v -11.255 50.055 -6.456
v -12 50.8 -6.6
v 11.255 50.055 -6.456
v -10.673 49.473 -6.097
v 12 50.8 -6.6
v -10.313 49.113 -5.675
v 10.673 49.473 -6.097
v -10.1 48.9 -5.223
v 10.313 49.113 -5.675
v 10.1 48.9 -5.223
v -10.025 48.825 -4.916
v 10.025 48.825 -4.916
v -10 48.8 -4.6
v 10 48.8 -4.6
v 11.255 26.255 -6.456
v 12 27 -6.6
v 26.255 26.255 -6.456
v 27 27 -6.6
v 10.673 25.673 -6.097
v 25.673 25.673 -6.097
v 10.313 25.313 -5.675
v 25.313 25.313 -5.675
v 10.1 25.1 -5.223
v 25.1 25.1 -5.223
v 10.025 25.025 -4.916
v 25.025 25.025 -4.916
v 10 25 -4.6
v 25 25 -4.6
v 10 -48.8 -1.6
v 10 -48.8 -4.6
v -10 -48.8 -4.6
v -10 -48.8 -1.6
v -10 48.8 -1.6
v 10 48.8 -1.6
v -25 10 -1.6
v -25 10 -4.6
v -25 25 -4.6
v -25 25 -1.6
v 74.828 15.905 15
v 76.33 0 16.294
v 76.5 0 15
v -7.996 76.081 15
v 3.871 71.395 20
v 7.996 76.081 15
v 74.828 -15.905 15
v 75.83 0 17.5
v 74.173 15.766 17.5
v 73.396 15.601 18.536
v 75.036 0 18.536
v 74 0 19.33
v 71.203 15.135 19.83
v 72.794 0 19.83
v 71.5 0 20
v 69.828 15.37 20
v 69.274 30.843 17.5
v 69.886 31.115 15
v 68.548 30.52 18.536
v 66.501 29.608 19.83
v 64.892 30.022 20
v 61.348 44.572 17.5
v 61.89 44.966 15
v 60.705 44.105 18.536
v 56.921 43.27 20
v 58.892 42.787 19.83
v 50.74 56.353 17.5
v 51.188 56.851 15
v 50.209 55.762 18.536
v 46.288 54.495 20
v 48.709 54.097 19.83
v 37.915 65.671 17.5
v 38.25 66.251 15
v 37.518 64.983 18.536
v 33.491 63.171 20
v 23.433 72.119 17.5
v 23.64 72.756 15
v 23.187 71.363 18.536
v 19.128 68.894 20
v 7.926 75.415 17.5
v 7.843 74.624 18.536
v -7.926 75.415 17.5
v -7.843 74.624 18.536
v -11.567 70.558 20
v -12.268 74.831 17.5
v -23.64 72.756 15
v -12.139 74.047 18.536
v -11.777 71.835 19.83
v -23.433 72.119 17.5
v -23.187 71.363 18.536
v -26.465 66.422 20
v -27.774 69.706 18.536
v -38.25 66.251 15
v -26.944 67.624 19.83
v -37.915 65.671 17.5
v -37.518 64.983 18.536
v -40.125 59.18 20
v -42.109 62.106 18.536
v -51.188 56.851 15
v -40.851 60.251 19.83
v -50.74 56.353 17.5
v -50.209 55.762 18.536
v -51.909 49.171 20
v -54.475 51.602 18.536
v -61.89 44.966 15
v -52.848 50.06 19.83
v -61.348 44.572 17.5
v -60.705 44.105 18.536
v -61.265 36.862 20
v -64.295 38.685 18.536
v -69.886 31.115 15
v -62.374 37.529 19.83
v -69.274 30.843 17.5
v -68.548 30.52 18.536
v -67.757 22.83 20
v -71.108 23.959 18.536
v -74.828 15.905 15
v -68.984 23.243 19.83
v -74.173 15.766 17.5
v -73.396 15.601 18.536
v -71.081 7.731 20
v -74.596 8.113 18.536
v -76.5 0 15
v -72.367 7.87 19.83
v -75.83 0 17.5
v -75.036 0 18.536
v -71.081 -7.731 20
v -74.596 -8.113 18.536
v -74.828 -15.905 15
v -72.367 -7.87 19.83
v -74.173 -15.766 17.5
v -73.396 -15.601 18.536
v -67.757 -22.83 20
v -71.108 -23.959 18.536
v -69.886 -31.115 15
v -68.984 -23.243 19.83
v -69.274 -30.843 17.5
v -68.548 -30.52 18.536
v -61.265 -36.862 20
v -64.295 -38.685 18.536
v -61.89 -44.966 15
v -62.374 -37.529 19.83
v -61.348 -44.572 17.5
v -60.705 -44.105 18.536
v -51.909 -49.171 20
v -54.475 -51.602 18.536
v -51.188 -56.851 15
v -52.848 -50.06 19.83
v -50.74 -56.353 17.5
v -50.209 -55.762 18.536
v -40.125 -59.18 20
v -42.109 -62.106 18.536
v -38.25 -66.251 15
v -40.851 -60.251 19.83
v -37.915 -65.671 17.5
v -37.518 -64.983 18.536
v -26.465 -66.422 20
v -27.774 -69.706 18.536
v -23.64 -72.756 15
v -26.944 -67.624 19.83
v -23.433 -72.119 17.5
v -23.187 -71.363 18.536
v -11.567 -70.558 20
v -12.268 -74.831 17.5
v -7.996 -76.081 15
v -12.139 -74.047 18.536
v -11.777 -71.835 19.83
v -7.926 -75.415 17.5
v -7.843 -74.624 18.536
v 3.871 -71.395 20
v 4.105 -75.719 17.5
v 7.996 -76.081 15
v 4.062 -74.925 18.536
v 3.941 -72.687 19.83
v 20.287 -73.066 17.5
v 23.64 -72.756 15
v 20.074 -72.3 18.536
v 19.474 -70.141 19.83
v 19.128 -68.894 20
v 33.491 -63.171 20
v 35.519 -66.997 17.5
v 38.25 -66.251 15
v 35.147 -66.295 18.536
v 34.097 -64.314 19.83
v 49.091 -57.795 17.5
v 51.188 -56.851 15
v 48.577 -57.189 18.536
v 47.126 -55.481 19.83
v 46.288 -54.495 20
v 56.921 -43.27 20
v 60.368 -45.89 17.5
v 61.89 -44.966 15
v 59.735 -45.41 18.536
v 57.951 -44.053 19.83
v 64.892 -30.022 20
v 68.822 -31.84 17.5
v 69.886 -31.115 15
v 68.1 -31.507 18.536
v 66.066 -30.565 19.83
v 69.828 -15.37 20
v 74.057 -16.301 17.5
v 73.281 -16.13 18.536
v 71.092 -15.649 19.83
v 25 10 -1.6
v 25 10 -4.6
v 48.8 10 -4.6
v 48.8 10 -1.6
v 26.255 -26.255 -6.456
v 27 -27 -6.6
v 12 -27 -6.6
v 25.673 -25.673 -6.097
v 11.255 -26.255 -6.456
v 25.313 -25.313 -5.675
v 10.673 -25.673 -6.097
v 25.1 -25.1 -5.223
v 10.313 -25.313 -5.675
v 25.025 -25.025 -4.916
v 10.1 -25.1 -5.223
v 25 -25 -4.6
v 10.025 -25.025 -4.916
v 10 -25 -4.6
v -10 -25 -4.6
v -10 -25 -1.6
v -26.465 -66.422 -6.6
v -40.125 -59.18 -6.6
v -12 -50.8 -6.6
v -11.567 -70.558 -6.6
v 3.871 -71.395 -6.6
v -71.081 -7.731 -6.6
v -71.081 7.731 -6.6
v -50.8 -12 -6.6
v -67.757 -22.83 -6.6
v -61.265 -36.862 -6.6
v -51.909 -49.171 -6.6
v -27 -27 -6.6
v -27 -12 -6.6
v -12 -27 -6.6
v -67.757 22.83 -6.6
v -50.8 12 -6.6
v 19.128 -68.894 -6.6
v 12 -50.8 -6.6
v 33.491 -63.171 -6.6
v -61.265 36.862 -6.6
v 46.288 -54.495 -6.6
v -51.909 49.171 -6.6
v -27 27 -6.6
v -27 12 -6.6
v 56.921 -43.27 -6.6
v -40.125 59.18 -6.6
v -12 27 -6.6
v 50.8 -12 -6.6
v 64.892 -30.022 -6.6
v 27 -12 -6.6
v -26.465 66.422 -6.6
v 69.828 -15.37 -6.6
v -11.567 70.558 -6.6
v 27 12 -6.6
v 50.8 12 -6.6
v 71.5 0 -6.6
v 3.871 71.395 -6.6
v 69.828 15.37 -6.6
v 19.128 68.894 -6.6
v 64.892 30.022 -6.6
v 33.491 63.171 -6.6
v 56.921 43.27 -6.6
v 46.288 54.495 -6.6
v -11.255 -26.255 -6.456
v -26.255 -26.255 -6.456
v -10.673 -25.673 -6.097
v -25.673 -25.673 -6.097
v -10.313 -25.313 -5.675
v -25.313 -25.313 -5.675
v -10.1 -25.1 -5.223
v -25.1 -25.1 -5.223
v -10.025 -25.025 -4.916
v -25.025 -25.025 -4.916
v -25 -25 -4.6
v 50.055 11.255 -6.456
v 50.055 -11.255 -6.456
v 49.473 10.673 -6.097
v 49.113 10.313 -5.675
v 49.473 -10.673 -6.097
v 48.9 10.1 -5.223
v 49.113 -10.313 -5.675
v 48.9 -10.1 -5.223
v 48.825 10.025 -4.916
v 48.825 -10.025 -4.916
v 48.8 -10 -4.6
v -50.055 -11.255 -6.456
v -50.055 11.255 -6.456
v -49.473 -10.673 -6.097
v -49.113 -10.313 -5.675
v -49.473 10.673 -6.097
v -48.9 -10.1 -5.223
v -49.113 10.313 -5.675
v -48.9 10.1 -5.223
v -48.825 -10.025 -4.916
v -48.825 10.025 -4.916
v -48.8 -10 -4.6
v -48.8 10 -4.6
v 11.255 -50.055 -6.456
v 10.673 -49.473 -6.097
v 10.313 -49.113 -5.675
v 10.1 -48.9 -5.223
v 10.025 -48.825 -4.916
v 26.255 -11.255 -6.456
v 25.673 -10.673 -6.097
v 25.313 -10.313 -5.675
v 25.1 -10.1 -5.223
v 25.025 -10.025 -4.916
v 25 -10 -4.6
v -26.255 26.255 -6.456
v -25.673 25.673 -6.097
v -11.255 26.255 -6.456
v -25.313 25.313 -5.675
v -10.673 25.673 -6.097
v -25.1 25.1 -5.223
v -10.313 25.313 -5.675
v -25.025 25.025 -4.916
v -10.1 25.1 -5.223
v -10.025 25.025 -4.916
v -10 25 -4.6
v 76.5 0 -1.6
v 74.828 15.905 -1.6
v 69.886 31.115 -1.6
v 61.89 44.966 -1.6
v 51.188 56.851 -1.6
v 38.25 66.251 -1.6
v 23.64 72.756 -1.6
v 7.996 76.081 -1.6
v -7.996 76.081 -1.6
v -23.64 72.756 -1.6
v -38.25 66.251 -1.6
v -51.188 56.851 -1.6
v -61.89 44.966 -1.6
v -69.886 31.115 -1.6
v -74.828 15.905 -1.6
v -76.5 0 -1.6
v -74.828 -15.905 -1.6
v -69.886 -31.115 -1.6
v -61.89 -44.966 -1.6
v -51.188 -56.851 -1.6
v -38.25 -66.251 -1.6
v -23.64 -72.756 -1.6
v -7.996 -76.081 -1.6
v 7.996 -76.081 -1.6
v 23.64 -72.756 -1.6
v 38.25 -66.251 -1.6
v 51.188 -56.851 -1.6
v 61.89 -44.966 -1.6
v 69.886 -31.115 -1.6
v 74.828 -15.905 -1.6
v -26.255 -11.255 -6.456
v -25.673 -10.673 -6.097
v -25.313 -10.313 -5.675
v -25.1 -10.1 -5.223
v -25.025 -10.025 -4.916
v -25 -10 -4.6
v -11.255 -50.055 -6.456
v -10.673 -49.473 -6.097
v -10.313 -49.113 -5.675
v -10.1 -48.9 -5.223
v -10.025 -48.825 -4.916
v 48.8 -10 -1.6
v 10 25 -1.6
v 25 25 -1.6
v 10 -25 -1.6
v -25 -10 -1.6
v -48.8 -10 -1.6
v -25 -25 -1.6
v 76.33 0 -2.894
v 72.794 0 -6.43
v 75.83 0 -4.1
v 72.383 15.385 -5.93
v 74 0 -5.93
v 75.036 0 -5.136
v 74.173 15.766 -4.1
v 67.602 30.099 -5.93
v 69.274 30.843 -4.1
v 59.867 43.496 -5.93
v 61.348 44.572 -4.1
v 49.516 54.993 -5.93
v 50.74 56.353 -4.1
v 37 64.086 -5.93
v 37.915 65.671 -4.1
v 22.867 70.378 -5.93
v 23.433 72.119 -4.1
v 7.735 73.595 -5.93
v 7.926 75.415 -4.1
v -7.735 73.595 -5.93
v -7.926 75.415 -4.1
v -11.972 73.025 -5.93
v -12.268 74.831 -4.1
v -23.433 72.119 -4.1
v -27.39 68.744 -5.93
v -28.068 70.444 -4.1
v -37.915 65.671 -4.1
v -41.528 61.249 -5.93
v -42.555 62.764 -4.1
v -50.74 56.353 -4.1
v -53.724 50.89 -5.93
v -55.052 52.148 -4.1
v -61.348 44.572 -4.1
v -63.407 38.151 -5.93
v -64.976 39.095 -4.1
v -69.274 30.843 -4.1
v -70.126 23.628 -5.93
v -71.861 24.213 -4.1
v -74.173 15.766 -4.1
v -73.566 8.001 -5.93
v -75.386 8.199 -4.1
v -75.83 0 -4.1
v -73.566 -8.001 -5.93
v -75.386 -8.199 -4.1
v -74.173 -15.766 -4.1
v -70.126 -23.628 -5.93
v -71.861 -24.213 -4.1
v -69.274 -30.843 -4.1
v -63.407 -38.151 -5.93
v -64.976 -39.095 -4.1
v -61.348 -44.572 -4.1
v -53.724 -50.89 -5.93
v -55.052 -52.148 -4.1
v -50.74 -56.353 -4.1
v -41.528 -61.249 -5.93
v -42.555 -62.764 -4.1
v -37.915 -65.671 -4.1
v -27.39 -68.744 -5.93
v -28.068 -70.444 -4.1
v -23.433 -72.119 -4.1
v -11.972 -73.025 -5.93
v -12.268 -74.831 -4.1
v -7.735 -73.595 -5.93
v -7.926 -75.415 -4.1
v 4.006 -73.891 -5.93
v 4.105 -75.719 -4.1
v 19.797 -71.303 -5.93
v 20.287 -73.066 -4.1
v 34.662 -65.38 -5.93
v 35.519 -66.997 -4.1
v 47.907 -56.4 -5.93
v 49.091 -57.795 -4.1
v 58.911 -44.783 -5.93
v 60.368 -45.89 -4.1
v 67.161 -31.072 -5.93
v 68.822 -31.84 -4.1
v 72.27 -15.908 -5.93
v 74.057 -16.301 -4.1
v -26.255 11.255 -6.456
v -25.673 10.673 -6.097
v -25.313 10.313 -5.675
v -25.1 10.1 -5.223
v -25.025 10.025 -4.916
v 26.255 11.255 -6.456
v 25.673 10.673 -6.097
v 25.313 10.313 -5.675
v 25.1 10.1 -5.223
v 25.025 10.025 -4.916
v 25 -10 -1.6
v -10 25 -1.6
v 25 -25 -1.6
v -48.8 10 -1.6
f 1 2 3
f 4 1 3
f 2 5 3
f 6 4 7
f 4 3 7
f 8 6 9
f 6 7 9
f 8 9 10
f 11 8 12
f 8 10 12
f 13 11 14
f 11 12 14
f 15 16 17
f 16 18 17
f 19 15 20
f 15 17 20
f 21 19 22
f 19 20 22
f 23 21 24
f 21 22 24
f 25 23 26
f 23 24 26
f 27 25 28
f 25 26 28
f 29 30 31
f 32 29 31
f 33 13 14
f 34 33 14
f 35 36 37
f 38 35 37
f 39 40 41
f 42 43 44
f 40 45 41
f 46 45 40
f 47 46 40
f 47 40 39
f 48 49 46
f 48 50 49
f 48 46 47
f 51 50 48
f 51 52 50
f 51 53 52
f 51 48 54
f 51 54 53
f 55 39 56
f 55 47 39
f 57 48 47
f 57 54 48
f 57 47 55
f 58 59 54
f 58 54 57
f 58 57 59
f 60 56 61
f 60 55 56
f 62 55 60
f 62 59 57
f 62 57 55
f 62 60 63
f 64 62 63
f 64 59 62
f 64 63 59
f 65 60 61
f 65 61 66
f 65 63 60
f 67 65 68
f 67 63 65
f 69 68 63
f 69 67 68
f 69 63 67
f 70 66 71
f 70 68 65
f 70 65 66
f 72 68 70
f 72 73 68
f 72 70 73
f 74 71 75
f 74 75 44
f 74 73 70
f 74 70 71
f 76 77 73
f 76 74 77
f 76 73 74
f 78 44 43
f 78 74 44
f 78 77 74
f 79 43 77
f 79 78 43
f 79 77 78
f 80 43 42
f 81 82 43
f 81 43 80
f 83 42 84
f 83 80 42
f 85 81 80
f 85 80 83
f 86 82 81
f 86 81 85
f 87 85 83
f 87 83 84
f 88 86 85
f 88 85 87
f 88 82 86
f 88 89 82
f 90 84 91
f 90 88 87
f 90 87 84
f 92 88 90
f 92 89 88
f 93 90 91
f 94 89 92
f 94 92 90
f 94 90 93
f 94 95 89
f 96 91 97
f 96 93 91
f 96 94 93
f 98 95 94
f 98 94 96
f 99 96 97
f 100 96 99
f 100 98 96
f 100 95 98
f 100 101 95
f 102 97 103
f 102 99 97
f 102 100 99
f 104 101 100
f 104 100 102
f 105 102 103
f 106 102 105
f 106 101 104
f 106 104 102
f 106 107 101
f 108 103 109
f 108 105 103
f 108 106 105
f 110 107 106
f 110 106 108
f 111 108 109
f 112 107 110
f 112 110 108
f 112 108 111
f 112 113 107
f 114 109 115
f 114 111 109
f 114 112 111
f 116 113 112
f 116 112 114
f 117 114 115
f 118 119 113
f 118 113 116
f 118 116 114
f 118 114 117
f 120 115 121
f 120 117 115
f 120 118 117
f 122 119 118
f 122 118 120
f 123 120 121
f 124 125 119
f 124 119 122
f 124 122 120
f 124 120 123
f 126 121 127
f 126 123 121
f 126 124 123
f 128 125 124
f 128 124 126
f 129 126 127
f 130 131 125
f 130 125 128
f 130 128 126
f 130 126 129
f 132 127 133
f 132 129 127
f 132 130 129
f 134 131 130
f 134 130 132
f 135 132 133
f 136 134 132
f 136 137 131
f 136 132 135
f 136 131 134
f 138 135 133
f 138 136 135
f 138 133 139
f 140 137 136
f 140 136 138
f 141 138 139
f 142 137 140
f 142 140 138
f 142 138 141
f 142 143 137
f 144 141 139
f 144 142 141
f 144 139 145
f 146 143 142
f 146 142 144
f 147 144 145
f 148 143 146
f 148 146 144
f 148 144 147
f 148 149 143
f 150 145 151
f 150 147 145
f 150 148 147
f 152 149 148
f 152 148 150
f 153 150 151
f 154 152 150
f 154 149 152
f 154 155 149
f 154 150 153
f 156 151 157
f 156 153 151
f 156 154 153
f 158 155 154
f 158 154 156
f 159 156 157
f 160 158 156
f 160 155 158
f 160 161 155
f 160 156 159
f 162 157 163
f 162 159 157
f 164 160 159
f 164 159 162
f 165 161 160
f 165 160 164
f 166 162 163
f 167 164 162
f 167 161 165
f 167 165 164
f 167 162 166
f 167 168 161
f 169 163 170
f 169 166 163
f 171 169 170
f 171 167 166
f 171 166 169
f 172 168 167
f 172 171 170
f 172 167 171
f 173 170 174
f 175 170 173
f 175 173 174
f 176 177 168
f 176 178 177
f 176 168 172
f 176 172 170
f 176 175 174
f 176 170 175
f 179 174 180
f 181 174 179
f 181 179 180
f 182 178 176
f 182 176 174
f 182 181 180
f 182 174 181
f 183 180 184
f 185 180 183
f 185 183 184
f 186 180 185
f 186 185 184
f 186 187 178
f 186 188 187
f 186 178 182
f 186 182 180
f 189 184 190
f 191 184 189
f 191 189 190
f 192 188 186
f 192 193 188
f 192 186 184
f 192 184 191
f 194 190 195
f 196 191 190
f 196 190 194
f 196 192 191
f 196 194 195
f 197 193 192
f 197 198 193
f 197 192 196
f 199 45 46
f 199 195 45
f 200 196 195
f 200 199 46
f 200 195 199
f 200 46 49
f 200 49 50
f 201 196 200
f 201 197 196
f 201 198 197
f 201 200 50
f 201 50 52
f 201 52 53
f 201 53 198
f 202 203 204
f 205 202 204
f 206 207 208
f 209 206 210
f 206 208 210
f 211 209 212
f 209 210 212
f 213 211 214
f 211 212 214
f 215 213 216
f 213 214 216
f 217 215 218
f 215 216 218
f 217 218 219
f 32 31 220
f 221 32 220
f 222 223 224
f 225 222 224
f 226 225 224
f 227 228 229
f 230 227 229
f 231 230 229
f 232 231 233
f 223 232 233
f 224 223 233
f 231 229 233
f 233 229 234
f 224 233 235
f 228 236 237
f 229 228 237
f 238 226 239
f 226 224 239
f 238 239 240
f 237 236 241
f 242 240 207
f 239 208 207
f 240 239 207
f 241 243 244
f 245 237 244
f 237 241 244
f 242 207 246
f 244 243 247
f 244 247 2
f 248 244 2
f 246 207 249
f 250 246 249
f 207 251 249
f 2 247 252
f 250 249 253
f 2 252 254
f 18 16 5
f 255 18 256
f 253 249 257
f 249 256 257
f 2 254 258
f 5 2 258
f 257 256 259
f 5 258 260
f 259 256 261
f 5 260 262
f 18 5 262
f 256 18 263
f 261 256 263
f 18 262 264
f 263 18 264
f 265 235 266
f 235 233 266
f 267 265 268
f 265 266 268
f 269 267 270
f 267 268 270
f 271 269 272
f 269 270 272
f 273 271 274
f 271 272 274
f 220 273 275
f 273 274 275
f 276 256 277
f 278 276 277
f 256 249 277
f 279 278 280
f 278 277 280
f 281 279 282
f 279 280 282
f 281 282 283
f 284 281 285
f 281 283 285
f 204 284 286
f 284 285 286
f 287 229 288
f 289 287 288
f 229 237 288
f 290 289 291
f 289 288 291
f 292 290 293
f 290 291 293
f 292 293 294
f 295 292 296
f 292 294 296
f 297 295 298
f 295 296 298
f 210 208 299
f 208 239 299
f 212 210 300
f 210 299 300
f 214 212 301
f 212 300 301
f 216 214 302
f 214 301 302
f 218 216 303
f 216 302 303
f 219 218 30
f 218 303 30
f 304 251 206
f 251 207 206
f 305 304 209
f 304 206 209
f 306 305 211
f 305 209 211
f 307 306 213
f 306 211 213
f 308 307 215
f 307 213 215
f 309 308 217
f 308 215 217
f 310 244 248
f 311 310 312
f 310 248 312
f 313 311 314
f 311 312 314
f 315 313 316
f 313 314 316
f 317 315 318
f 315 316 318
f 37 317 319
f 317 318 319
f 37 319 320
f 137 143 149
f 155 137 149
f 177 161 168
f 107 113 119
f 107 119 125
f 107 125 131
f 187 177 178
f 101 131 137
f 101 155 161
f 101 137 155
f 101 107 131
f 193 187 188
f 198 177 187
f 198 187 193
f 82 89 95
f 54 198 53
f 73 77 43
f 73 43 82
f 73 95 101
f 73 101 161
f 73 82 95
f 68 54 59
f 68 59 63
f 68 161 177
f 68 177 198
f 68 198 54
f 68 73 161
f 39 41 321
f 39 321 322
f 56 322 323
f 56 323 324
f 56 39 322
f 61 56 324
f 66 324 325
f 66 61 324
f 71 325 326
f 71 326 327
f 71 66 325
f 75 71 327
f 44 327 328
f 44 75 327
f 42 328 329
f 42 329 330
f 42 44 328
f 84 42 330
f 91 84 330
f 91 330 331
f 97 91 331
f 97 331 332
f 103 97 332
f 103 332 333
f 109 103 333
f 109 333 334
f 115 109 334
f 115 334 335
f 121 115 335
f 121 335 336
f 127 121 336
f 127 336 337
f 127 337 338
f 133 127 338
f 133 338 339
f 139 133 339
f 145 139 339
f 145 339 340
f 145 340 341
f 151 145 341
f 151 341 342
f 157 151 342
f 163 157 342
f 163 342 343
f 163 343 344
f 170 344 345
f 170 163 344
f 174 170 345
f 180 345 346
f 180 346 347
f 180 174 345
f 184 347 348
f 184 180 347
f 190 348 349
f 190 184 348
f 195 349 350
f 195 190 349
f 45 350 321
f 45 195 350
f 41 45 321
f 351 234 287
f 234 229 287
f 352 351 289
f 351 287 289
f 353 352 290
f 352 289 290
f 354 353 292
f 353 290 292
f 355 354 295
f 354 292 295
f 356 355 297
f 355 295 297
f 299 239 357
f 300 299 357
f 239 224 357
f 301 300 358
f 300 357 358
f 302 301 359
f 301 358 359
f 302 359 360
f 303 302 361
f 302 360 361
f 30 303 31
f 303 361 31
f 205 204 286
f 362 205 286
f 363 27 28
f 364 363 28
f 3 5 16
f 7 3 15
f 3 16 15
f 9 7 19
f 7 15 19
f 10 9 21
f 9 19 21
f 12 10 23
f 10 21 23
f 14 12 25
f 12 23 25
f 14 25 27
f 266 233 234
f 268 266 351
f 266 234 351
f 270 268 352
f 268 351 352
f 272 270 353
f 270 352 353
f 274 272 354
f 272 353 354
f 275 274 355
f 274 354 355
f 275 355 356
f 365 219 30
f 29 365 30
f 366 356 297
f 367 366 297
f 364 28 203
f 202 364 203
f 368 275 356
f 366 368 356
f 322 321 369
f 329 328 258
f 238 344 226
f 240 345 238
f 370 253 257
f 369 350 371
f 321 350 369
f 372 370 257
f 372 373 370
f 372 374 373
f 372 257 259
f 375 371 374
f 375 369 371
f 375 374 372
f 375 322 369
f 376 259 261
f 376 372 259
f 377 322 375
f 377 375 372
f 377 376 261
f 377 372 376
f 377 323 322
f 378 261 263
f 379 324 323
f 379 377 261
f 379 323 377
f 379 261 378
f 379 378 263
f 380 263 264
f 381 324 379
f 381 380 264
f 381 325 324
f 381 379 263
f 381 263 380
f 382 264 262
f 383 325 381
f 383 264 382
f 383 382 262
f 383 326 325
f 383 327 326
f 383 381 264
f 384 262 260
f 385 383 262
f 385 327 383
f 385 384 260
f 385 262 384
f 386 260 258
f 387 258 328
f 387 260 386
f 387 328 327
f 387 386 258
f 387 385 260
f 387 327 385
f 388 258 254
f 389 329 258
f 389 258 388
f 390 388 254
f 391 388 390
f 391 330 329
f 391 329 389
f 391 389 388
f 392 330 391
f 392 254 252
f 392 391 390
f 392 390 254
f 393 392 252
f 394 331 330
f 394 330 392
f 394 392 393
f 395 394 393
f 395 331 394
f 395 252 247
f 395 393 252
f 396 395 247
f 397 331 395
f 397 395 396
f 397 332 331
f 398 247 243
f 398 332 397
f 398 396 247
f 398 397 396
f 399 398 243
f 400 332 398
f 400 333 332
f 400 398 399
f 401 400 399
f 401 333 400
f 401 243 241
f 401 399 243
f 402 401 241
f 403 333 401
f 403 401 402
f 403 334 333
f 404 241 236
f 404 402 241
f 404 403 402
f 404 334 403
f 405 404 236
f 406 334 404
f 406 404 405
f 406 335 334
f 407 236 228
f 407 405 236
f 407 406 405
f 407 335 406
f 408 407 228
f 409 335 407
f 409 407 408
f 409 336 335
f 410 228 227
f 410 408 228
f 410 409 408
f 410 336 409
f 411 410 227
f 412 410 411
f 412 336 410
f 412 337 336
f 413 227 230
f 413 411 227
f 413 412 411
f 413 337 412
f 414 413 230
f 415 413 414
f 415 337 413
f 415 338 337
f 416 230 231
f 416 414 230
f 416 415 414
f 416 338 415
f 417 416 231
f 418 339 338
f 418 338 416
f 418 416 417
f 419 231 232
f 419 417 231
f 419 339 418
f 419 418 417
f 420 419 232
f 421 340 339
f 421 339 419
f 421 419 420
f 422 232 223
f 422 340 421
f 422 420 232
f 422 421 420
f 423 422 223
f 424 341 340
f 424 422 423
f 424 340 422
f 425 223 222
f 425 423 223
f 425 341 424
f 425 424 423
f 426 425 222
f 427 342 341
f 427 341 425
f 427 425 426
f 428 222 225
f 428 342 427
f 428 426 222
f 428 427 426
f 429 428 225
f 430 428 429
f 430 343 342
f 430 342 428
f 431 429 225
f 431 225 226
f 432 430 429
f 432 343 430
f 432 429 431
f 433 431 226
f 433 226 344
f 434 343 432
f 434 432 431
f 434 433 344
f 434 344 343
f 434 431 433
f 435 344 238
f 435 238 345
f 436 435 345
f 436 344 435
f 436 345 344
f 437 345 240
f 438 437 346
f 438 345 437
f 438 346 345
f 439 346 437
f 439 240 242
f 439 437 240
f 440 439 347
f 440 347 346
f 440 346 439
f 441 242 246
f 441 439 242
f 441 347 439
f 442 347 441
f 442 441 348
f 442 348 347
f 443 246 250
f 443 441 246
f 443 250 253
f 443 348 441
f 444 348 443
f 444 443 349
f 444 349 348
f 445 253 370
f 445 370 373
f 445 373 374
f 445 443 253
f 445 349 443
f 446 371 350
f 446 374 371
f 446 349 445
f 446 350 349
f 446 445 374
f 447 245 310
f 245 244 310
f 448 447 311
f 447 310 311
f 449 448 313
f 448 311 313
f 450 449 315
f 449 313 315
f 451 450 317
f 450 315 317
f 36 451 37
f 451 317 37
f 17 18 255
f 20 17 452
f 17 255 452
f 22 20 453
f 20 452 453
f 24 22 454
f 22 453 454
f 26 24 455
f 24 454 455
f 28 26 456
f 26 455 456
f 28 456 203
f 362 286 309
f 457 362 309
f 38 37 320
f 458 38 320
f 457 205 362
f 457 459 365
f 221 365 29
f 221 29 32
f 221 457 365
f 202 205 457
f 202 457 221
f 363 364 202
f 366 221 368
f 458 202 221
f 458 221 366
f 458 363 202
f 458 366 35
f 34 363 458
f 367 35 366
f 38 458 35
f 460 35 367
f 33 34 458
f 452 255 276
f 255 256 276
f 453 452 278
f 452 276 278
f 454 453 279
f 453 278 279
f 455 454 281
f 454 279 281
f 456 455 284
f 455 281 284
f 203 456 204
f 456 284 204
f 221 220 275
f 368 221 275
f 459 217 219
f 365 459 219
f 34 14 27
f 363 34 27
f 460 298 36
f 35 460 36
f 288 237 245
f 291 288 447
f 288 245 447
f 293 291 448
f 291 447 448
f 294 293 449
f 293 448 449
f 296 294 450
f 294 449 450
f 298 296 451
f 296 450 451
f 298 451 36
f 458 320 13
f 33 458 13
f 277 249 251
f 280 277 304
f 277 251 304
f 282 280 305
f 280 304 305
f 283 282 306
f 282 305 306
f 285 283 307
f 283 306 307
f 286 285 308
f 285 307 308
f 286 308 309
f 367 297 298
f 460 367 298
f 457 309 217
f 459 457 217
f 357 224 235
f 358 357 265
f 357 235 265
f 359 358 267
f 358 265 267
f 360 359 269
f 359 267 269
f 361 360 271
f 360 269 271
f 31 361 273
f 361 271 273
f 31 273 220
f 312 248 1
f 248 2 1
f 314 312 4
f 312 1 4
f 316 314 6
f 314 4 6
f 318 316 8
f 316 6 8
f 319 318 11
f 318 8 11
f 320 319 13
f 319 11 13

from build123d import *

# Parameters (mm, degrees)
SKICA1_R                     = 76.5
P_IDAT_VYSUNUT_M1_DEPTH      = 20
P_IDAT_VYSUNUT_M1_DEPTH_BACK = 6.6
ODEBRAT_VYSUNUT_M1_DEPTH     = 5
ZAOBLIT1_R                   = 2
ZAOBLIT2_R                   = 5


with BuildPart() as part:
    # Skica1 → Přidat vysunutím1 (new body, two sides)
    with BuildSketch(Plane.XY) as p_idat_vysunut_m1_sk:
        Circle(SKICA1_R)
    extrude(amount=P_IDAT_VYSUNUT_M1_DEPTH)
    extrude(p_idat_vysunut_m1_sk.sketch, amount=-P_IDAT_VYSUNUT_M1_DEPTH_BACK)

    # Skica2 → Odebrat vysunutím1 (cut)
    with BuildSketch(Plane(origin=(0, 0, -6.6), x_dir=(-1, 0, 0), z_dir=(0, 0, -1))):
        Polygon((25, -10), (48.8, -10), (48.8, 10), (25, 10), (25, 25), (10, 25), (10, 48.8), (-10, 48.8), (-10, 25), (-25, 25), (-25, 10), (-48.8, 10), (-48.8, -10), (-25, -10), (-25, -25), (-10, -25), (-10, -48.8), (10, -48.8), (10, -25), (25, -25), align=None)
    extrude(amount=-ODEBRAT_VYSUNUT_M1_DEPTH, mode=Mode.SUBTRACT)

    # Zaoblit1
    zaoblit1_edges = [part.edges().sort_by_distance(p)[0] for p in [
        (-25, -17.5, -6.6),
        (-36.9, -10, -6.6),
        (-48.8, 0, -6.6),
        (-36.9, 10, -6.6),
        (-25, 17.5, -6.6),
        (-17.5, 25, -6.6),
        (-10, 36.9, -6.6),
        (0, 48.8, -6.6),
        (10, 36.9, -6.6),
        (17.5, 25, -6.6),
        (25, 17.5, -6.6),
        (36.9, 10, -6.6),
        (48.8, 0, -6.6),
        (36.9, -10, -6.6),
        (25, -17.5, -6.6),
        (17.5, -25, -6.6),
        (10, -36.9, -6.6),
        (0, -48.8, -6.6),
        (-10, -36.9, -6.6),
        (-17.5, -25, -6.6),
    ]]
    fillet(zaoblit1_edges, radius=ZAOBLIT1_R)

    # Zaoblit2
    zaoblit2_edges = [part.edges().sort_by_distance(p)[0] for p in [
        (-76.5, 0, 20),
        (-76.5, 0, -6.6),
    ]]
    fillet(zaoblit2_edges, radius=ZAOBLIT2_R)


solid = part.part
